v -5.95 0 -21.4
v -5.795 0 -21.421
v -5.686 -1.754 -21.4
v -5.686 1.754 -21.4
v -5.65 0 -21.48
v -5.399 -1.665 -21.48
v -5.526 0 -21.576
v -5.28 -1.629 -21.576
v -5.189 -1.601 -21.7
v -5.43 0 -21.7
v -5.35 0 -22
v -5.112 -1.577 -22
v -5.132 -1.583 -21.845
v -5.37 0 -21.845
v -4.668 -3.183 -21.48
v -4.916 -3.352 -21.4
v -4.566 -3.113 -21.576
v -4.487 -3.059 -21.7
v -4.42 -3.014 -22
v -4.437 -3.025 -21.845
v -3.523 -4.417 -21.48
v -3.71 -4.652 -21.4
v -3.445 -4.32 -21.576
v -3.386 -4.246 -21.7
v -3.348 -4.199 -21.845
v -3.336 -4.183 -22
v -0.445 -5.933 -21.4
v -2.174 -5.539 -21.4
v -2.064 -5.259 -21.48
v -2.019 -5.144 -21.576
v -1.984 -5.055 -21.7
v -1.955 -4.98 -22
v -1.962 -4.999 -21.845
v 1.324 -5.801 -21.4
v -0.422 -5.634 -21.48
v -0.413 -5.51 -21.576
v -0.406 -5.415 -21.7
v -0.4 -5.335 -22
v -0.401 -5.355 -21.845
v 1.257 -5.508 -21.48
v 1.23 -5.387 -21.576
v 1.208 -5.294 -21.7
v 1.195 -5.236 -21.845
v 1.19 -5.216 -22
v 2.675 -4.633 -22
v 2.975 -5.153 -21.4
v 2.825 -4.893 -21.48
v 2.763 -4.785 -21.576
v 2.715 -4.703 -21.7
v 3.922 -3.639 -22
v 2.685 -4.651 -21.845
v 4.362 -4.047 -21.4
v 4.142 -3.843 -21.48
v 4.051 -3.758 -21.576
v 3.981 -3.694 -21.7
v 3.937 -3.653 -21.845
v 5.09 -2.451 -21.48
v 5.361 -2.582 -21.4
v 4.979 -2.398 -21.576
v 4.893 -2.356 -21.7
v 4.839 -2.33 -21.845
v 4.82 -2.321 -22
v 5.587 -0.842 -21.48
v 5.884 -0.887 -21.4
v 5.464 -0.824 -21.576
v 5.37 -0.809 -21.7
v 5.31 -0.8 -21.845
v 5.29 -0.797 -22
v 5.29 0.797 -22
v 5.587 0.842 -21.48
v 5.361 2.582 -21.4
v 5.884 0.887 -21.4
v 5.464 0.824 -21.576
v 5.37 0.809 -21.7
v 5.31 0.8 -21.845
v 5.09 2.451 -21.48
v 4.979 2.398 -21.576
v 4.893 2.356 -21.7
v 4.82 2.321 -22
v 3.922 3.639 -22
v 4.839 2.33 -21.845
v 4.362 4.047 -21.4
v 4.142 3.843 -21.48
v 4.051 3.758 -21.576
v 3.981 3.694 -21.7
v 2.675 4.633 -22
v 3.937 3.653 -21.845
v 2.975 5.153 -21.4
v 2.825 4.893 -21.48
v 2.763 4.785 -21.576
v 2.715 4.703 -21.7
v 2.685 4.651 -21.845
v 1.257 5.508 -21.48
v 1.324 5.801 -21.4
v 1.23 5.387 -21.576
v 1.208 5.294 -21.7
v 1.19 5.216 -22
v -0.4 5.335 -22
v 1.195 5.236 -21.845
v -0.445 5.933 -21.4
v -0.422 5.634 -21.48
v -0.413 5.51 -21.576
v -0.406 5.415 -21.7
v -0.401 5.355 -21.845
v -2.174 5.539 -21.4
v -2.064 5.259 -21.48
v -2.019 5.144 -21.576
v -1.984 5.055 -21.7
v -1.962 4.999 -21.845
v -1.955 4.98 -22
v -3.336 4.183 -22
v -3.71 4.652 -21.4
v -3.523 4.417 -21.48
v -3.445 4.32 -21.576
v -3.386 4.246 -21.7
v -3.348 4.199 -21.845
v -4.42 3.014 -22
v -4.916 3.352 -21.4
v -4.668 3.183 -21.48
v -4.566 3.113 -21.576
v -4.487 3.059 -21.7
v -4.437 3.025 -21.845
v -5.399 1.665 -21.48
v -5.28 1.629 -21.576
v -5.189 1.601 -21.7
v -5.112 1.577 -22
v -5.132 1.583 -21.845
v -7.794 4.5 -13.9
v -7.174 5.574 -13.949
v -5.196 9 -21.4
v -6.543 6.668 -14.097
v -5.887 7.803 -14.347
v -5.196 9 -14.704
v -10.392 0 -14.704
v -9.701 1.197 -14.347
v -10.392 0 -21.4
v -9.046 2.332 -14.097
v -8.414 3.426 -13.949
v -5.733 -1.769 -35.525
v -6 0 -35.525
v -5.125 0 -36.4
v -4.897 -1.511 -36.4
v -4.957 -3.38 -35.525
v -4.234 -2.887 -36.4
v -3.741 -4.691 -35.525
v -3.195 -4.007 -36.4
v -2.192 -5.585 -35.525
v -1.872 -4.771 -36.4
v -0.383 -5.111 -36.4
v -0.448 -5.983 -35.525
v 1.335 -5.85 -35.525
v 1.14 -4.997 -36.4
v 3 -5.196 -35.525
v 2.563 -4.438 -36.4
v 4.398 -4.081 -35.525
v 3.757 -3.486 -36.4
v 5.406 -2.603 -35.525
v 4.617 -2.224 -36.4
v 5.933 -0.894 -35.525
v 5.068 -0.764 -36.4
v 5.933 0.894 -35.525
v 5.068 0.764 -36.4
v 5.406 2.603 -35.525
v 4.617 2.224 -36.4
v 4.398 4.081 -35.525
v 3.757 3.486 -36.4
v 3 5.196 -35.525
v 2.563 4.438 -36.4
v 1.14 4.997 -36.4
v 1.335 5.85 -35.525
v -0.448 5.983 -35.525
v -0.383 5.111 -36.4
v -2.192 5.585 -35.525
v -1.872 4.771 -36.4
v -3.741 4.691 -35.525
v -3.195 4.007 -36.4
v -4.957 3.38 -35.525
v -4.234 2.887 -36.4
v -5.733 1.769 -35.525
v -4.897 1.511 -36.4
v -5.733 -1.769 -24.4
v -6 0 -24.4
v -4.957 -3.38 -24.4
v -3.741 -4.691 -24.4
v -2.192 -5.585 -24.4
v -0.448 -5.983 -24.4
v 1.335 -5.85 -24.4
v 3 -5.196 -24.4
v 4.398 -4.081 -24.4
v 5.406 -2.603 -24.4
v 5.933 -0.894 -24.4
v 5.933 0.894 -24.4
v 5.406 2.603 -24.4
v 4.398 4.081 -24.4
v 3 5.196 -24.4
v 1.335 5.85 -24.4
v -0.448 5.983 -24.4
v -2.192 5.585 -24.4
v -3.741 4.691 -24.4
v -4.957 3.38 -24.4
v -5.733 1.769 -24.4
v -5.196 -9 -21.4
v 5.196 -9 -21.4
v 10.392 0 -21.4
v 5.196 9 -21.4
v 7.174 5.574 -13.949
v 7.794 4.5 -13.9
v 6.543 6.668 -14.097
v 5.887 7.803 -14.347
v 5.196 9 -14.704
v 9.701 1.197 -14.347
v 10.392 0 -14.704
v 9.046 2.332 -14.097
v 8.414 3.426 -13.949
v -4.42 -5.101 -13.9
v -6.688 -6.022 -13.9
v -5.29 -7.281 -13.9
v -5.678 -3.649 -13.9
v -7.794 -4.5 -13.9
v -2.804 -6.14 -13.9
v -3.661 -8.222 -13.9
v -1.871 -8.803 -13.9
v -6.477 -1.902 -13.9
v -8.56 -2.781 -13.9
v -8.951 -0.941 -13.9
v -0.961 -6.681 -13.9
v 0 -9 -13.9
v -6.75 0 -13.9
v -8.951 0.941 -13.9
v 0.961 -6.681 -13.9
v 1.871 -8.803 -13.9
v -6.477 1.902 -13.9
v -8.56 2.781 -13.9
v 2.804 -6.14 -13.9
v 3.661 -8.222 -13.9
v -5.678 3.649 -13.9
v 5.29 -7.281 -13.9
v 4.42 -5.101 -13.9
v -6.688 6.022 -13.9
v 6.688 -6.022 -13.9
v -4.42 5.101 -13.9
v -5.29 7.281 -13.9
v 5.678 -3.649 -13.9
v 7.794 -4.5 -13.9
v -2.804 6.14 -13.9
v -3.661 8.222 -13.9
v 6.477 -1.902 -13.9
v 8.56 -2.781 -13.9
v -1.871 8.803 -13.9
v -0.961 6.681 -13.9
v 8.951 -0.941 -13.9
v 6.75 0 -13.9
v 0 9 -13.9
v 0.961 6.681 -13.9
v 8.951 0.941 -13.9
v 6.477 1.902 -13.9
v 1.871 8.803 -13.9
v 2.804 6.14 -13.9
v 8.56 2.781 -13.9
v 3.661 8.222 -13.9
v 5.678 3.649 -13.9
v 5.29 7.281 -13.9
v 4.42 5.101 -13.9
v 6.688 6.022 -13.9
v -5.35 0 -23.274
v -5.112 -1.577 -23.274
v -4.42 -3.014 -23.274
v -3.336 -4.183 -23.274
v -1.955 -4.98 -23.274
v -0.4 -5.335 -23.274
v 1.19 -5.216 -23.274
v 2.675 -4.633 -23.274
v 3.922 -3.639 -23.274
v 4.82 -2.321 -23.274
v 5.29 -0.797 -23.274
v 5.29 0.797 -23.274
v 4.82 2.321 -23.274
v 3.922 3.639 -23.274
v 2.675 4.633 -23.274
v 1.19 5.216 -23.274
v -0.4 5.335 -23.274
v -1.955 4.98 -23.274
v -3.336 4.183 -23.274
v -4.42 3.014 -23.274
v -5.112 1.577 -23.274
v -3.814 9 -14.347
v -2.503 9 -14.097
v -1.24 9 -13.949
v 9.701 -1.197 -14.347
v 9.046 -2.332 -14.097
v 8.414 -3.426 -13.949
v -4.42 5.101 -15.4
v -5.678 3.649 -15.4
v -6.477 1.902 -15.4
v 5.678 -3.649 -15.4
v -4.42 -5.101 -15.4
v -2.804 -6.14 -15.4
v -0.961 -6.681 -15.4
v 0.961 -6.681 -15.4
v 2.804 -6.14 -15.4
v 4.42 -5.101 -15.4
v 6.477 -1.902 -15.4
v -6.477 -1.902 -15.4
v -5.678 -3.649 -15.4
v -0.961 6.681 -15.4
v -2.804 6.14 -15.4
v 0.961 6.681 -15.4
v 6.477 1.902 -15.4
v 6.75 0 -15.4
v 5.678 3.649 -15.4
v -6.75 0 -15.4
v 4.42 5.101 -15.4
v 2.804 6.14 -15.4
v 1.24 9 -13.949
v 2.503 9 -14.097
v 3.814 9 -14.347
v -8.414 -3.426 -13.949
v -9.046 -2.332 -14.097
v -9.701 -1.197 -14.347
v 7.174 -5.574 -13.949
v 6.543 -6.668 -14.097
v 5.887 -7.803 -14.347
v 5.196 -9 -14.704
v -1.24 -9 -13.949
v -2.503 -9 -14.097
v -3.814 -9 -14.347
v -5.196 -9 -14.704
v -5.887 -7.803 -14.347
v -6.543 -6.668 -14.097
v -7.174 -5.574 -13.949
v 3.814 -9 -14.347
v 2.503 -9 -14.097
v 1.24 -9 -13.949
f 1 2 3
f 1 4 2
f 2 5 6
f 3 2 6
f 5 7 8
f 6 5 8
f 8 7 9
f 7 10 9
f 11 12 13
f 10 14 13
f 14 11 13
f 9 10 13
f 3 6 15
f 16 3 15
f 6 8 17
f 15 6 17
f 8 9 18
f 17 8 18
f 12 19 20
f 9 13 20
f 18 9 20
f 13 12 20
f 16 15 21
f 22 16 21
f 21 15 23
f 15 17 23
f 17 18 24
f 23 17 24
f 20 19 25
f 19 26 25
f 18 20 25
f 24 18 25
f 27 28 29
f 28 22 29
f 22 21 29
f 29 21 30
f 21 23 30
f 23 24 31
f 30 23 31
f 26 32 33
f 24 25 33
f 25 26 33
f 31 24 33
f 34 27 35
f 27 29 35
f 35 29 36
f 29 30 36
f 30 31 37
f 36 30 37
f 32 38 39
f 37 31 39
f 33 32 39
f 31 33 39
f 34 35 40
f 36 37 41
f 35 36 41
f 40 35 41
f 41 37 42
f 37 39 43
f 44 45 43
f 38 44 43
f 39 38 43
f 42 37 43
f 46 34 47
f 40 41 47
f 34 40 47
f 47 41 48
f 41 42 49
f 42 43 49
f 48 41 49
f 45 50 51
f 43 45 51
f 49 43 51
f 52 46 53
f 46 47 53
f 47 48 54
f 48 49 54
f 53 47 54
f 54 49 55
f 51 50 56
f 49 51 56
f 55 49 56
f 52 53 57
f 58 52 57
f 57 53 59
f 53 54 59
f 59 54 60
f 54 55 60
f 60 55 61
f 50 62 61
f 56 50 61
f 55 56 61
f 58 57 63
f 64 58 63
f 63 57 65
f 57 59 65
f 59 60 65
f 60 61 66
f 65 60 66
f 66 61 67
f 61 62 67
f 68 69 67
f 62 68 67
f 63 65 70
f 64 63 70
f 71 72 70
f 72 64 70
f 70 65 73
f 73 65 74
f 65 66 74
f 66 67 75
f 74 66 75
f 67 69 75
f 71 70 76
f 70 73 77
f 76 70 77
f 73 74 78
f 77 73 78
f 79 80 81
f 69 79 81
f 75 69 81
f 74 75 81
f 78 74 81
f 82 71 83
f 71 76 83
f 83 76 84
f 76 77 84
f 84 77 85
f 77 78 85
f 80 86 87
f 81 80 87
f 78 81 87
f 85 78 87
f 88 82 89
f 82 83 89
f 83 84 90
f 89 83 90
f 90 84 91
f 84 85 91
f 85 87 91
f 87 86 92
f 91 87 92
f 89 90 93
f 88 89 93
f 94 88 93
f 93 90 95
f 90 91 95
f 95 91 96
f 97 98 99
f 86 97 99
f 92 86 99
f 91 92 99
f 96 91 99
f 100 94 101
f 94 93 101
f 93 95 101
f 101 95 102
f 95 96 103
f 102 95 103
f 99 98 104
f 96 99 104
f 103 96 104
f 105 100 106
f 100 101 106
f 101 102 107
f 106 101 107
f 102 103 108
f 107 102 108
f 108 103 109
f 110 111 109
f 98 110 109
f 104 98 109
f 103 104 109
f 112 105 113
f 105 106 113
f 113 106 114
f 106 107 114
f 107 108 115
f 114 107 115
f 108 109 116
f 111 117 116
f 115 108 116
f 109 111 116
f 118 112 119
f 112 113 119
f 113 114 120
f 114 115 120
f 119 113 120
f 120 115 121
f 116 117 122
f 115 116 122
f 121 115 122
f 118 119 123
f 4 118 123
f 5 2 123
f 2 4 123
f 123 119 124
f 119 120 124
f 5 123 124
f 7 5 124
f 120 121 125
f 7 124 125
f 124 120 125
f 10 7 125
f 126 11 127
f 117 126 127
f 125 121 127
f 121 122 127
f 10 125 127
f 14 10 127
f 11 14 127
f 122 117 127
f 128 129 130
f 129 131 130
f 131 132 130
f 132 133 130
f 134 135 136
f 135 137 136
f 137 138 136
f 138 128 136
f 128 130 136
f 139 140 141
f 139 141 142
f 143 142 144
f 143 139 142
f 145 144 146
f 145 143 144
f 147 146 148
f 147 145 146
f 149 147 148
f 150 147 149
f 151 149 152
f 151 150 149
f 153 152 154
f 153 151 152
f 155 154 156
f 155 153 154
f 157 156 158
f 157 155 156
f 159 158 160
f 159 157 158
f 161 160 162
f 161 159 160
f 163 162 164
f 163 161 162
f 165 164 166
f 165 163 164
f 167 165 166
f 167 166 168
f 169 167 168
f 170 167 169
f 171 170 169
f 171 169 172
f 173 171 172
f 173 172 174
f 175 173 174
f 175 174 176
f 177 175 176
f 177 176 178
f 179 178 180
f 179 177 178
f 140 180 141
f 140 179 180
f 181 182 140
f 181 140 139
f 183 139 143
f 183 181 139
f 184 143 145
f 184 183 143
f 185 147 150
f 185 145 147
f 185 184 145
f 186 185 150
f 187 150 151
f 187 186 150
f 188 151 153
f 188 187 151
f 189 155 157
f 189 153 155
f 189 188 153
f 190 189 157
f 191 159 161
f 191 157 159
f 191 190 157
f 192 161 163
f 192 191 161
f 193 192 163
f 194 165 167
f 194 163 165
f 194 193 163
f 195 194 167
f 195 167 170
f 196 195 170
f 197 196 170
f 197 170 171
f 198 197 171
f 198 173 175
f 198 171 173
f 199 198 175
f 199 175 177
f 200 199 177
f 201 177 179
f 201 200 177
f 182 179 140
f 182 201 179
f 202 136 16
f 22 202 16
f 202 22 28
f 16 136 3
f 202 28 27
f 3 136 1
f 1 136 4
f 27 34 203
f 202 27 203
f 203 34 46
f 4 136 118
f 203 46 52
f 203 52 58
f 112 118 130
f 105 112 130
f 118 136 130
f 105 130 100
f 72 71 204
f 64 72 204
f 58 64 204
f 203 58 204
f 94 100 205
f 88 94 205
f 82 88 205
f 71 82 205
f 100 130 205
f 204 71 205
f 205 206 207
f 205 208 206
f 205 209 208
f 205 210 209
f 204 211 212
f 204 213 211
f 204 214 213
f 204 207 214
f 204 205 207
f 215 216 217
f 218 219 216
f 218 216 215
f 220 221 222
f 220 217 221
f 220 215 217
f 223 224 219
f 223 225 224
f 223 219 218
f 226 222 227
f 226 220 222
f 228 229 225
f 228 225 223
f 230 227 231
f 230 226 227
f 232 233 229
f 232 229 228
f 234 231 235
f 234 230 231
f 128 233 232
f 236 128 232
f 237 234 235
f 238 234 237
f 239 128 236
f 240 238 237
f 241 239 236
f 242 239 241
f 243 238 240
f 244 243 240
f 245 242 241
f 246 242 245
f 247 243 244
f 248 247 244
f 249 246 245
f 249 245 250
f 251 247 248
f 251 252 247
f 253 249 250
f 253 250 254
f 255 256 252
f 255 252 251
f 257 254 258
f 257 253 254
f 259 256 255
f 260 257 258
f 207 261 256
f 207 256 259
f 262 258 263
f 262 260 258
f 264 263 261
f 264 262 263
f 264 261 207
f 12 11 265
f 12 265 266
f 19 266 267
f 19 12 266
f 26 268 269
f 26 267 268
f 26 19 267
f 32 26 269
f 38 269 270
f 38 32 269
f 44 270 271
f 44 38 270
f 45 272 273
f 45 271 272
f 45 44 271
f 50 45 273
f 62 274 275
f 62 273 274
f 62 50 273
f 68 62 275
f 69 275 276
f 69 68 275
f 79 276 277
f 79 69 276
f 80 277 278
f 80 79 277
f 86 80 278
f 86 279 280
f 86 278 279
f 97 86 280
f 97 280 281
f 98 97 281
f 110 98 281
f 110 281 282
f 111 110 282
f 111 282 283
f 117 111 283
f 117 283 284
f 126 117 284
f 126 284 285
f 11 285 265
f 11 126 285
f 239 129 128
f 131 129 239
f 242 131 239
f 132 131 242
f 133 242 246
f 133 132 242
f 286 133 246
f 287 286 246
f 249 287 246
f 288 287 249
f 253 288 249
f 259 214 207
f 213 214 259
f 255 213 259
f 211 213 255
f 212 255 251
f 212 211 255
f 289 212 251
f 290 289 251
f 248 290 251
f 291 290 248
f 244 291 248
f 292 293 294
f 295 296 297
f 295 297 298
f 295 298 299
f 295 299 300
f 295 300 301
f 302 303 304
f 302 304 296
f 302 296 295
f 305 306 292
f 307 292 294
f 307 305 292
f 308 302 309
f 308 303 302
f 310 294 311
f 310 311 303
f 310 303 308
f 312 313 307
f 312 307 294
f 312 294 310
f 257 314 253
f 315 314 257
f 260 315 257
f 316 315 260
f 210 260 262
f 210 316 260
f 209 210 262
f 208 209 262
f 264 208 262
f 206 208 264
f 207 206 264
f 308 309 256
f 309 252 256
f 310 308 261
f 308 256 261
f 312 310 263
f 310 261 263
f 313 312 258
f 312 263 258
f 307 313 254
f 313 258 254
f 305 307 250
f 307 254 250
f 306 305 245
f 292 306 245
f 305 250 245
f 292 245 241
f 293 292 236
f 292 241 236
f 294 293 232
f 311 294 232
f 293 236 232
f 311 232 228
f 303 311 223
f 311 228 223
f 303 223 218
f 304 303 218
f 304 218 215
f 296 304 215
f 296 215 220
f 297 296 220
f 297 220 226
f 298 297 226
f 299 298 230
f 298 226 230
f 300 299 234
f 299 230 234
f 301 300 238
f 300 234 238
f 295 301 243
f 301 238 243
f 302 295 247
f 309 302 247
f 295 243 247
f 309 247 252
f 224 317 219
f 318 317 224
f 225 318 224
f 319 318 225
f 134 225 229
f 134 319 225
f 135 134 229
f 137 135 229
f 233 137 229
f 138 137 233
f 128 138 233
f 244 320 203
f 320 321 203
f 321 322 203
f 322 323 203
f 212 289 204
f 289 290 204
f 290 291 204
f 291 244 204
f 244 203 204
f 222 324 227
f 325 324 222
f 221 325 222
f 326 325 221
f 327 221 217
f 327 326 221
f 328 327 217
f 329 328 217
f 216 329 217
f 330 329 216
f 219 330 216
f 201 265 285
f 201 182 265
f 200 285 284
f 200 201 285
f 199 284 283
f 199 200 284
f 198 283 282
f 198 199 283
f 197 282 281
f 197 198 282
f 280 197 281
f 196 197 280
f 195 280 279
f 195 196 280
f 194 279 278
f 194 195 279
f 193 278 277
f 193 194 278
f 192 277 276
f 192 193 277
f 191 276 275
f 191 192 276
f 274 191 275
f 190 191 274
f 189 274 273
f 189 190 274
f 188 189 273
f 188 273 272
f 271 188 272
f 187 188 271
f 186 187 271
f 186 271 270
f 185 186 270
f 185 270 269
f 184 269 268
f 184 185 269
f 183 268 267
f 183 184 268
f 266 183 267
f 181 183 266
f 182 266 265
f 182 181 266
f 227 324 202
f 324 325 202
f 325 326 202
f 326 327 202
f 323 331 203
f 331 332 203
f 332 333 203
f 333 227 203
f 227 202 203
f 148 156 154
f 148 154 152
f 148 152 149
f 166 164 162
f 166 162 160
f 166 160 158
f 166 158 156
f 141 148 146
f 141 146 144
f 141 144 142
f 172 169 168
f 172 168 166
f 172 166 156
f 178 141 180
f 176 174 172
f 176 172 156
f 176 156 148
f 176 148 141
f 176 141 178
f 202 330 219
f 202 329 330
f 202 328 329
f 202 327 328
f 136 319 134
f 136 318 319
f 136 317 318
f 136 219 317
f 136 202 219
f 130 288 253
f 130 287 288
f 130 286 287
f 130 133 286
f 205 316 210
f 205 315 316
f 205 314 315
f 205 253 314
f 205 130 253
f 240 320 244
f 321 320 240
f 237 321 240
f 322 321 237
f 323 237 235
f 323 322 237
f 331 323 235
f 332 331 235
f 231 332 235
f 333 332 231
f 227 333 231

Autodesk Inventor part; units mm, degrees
ref_plane "YZ Plane" through (0, 0, 0) normal (1, 0, 0) x (0, 1, 0)
sketch "Sketch2" plane through (0, 0, 0) normal (0, 1, 0) x (-1, 0, 0)
  line L0 (0, -21.4001) -> (0, -36.4001)
  line L1 (0, -36.4001) -> (5.125, -36.4001)
  line L2 (6, -35.5251) -> (6, -24.4001)
  line L3 (6, -24.4001) -> (5.35, -23.2742)
  line L4 (5.35, -23.2742) -> (5.35, -21.4001)
  line L5 (5.35, -21.4001) -> (0, -21.4001)
  line L6 (5.125, -36.4001) -> (6, -35.5251)
  line L7 (6, -36.4001) -> (6, -37.6375)
  line L8 (0, -40.885) -> (0, -18.1526) projected
  dimension "Ds" = 10.7
  dimension "NND" = 12
  dimension "b" = 12
  dimension "d3" = 30
  dimension "d5" = 45
  dimension "PTC" = 1.75
  dimension "NLG" = 15
revolve "Revolution1" add sketch "Sketch2" angle 360 about axis through (0, 0, -21.4001) along (0, 0, -1)
sketch "Sketch3" plane through (0, 0, -21.4001) normal (0, 0, 1) x (1, 0, 0)
  circle A0 centre (0, 0) radius 5.35 projected
  line L0 (0, 9) -> (5.1962, 9)
  line L1 (5.1962, 9) -> (10.3923, 0)
  line L2 (10.3923, 0) -> (0, 0)
  line L3 (0, 0) -> (0, 9)
  line L4 (0, 9) -> (-5.1962, 9)
  line L5 (-5.1962, 9) -> (-10.3923, 0)
  line L6 (0, -9) -> (5.1962, -9)
  line L7 (5.1962, -9) -> (10.3923, 0)
  line L8 (-5.1962, -9) -> (-10.3923, 0)
  line L9 (0, -9) -> (-5.1962, -9)
  dimension "d9" = 60
  dimension "ParS" = 18
  dimension "msp_d11" = 18
extrude "Extrusion1" add sketch "Sketch3" along normal blind 7.5
sketch "Sketch4" plane through (0, 0, 0) normal (0, 1, 0) x (-1, 0, 0)
  line L0 (-9, -13.9001) -> (-10.3923, -13.9001)
  line L1 (-10.3923, -13.9001) -> (-10.3923, -14.7039)
  line L2 (-10.3923, -14.7039) -> (-9, -13.9001)
  line L3 (0, -25.2766) -> (0, 36.8591) projected
  line L4 (0, 27.9826) -> (0, 27.1787)
  line L5 (-10.3923, -21.4001) -> (-10.3923, -13.9001) projected
  line L6 (-5.1962, -13.9001) -> (-10.3923, -13.9001) projected
  dimension "d14" = 30
  dimension "msp_d15" = 18
revolve "Revolution2" cut sketch "Sketch4" angle 360 about axis through (0, 0, 27.9826) along (0, 0, -1)
sketch "Sketch5" plane through (0, 0, -13.9001) normal (0, 0, 1) x (1, 0, 0)
  arc A0 (7.7942, 4.5) -> (0, 9) centre (0, 0) ccw projected
  circle A1 centre (0, 0) radius 6.75
  dimension "d27" = 13.5
extrude "Extrusion2" cut sketch "Sketch5" against normal blind 1.5
thread "Thread1" size "M12x1.75" class "6g" standard "ISO Metric profile" full length
ref_plane "MSC_PF1" through (0, 0, 0) normal (0, 1, 0) x (-1, 0, 0)
ref_plane "MSC_PT1" through (0, 0, -21.4001) normal (0, 0, -1) x (-1, 0, 0)
fillet "Fillet1" radius 0.6 1 edges at (5.35, 0, -21.4001)
equation "\"msp_d11\" = ParS"
equation "\"msp_d15\" = ParS"
equation "\"d27\" = 0.75 * ParS"
equation "\"d28\" = 0.2 * ParK"
equation "\"d30\" = r"
equation "\"msp_d17\" = b"
equation "\"r\" = 0.6"
equation "\"THREADDIA\" = NND"
equation "\"ParK\" = 7.5"
properties part number "ISO 4015 - M12 x 45" material "Stainless Steel, 440C"
